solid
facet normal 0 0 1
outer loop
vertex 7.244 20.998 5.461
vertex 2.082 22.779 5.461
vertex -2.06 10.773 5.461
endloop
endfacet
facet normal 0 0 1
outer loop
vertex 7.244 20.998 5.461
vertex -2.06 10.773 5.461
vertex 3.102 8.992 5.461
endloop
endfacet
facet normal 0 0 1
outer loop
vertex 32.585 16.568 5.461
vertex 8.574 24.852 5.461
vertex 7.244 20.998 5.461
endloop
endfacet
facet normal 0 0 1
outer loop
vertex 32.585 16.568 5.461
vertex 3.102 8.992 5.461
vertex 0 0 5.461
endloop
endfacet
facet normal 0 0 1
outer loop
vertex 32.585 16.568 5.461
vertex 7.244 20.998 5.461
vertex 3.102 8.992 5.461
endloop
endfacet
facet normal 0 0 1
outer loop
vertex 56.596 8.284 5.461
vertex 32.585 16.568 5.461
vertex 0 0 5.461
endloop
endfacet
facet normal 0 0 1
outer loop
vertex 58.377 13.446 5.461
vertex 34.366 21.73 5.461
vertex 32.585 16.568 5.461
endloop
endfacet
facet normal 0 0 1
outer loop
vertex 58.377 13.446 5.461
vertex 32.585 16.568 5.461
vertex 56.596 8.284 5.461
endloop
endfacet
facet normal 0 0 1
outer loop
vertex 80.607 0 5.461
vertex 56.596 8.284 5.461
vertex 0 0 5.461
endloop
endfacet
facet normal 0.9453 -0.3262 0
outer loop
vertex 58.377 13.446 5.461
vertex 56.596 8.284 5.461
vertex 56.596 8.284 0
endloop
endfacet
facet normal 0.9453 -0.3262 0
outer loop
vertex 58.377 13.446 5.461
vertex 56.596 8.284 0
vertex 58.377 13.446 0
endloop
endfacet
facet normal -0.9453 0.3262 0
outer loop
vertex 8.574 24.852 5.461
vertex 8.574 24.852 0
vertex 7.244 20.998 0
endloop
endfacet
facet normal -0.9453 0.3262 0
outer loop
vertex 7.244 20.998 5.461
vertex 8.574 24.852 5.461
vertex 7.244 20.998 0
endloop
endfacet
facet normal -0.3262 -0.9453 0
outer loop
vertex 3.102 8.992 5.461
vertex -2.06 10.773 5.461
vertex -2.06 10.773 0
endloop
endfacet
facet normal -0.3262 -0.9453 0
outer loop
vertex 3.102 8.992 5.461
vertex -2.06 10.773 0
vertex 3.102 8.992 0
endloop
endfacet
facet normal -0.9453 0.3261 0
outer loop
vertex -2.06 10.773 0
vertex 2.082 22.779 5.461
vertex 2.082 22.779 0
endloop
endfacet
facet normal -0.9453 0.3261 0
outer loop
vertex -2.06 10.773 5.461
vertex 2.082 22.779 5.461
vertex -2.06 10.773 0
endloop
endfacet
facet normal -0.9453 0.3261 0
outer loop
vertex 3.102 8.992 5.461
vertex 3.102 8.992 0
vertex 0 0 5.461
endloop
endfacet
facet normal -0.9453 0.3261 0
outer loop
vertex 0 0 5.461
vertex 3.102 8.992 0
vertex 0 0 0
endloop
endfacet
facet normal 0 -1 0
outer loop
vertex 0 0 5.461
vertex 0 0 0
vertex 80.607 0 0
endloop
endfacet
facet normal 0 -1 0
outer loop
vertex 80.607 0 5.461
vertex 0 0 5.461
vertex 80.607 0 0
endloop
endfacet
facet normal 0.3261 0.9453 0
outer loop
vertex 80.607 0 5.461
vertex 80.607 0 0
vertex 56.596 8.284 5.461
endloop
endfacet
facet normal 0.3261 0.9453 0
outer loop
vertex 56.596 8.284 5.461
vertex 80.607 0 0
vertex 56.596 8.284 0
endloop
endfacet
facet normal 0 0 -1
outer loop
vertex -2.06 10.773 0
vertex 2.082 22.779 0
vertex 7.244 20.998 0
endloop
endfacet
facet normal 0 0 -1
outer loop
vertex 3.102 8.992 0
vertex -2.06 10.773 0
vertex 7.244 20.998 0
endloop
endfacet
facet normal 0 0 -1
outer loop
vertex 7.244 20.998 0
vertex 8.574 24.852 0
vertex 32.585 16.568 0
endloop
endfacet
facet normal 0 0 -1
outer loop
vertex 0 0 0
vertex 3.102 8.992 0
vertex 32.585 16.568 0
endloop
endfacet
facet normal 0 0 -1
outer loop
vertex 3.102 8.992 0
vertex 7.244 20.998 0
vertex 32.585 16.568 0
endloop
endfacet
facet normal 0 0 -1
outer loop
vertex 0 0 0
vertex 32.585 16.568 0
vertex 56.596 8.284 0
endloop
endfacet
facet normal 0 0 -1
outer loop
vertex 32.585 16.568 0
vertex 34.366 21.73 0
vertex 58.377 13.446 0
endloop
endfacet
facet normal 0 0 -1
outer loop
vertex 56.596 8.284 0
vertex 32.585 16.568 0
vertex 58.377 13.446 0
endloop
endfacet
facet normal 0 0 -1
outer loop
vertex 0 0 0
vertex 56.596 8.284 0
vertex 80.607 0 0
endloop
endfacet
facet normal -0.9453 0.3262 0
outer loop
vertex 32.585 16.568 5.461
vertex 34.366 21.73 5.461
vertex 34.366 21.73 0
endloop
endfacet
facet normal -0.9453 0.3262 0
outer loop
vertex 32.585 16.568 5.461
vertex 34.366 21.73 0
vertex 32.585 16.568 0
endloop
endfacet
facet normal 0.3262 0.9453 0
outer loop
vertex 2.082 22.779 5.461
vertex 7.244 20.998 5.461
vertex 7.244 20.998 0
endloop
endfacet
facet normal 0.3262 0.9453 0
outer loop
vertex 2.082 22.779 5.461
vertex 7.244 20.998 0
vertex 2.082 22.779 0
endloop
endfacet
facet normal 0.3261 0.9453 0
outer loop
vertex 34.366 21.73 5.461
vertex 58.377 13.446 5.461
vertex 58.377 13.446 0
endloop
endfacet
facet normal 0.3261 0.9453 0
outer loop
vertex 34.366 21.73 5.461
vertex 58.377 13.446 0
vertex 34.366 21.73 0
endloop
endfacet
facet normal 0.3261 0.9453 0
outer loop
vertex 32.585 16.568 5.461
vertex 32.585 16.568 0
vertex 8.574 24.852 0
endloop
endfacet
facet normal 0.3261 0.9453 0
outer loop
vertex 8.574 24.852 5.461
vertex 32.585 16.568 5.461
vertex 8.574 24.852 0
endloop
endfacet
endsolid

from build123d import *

# Parameters (mm, degrees)
BOSS_EXTRUDE1_DEPTH = 5.461
BOSS_EXTRUDE2_DEPTH = 5.461


with BuildPart() as part:
    # Sketch1 → Boss-Extrude1 (new body)
    with BuildSketch(Plane.XY):
        Polygon((0, 0), (80.607391231, 0), (8.573798388, 24.851589531), align=None)
    extrude(amount=BOSS_EXTRUDE1_DEPTH)

    # Sketch2 → Boss-Extrude2 (add)
    with BuildSketch(Plane.XY.offset(5.461)):
        Polygon((7.244238348, 20.997792314), (2.081830861, 22.778822897), (-2.060100727, 10.77322409), (3.10230676, 8.992193507), align=None)
        Polygon((32.584996002, 16.567726354), (56.596193616, 8.283863177), (58.377224199, 13.446270664), (34.366026585, 21.730133841), align=None)
    extrude(amount=-BOSS_EXTRUDE2_DEPTH)


solid = part.part
